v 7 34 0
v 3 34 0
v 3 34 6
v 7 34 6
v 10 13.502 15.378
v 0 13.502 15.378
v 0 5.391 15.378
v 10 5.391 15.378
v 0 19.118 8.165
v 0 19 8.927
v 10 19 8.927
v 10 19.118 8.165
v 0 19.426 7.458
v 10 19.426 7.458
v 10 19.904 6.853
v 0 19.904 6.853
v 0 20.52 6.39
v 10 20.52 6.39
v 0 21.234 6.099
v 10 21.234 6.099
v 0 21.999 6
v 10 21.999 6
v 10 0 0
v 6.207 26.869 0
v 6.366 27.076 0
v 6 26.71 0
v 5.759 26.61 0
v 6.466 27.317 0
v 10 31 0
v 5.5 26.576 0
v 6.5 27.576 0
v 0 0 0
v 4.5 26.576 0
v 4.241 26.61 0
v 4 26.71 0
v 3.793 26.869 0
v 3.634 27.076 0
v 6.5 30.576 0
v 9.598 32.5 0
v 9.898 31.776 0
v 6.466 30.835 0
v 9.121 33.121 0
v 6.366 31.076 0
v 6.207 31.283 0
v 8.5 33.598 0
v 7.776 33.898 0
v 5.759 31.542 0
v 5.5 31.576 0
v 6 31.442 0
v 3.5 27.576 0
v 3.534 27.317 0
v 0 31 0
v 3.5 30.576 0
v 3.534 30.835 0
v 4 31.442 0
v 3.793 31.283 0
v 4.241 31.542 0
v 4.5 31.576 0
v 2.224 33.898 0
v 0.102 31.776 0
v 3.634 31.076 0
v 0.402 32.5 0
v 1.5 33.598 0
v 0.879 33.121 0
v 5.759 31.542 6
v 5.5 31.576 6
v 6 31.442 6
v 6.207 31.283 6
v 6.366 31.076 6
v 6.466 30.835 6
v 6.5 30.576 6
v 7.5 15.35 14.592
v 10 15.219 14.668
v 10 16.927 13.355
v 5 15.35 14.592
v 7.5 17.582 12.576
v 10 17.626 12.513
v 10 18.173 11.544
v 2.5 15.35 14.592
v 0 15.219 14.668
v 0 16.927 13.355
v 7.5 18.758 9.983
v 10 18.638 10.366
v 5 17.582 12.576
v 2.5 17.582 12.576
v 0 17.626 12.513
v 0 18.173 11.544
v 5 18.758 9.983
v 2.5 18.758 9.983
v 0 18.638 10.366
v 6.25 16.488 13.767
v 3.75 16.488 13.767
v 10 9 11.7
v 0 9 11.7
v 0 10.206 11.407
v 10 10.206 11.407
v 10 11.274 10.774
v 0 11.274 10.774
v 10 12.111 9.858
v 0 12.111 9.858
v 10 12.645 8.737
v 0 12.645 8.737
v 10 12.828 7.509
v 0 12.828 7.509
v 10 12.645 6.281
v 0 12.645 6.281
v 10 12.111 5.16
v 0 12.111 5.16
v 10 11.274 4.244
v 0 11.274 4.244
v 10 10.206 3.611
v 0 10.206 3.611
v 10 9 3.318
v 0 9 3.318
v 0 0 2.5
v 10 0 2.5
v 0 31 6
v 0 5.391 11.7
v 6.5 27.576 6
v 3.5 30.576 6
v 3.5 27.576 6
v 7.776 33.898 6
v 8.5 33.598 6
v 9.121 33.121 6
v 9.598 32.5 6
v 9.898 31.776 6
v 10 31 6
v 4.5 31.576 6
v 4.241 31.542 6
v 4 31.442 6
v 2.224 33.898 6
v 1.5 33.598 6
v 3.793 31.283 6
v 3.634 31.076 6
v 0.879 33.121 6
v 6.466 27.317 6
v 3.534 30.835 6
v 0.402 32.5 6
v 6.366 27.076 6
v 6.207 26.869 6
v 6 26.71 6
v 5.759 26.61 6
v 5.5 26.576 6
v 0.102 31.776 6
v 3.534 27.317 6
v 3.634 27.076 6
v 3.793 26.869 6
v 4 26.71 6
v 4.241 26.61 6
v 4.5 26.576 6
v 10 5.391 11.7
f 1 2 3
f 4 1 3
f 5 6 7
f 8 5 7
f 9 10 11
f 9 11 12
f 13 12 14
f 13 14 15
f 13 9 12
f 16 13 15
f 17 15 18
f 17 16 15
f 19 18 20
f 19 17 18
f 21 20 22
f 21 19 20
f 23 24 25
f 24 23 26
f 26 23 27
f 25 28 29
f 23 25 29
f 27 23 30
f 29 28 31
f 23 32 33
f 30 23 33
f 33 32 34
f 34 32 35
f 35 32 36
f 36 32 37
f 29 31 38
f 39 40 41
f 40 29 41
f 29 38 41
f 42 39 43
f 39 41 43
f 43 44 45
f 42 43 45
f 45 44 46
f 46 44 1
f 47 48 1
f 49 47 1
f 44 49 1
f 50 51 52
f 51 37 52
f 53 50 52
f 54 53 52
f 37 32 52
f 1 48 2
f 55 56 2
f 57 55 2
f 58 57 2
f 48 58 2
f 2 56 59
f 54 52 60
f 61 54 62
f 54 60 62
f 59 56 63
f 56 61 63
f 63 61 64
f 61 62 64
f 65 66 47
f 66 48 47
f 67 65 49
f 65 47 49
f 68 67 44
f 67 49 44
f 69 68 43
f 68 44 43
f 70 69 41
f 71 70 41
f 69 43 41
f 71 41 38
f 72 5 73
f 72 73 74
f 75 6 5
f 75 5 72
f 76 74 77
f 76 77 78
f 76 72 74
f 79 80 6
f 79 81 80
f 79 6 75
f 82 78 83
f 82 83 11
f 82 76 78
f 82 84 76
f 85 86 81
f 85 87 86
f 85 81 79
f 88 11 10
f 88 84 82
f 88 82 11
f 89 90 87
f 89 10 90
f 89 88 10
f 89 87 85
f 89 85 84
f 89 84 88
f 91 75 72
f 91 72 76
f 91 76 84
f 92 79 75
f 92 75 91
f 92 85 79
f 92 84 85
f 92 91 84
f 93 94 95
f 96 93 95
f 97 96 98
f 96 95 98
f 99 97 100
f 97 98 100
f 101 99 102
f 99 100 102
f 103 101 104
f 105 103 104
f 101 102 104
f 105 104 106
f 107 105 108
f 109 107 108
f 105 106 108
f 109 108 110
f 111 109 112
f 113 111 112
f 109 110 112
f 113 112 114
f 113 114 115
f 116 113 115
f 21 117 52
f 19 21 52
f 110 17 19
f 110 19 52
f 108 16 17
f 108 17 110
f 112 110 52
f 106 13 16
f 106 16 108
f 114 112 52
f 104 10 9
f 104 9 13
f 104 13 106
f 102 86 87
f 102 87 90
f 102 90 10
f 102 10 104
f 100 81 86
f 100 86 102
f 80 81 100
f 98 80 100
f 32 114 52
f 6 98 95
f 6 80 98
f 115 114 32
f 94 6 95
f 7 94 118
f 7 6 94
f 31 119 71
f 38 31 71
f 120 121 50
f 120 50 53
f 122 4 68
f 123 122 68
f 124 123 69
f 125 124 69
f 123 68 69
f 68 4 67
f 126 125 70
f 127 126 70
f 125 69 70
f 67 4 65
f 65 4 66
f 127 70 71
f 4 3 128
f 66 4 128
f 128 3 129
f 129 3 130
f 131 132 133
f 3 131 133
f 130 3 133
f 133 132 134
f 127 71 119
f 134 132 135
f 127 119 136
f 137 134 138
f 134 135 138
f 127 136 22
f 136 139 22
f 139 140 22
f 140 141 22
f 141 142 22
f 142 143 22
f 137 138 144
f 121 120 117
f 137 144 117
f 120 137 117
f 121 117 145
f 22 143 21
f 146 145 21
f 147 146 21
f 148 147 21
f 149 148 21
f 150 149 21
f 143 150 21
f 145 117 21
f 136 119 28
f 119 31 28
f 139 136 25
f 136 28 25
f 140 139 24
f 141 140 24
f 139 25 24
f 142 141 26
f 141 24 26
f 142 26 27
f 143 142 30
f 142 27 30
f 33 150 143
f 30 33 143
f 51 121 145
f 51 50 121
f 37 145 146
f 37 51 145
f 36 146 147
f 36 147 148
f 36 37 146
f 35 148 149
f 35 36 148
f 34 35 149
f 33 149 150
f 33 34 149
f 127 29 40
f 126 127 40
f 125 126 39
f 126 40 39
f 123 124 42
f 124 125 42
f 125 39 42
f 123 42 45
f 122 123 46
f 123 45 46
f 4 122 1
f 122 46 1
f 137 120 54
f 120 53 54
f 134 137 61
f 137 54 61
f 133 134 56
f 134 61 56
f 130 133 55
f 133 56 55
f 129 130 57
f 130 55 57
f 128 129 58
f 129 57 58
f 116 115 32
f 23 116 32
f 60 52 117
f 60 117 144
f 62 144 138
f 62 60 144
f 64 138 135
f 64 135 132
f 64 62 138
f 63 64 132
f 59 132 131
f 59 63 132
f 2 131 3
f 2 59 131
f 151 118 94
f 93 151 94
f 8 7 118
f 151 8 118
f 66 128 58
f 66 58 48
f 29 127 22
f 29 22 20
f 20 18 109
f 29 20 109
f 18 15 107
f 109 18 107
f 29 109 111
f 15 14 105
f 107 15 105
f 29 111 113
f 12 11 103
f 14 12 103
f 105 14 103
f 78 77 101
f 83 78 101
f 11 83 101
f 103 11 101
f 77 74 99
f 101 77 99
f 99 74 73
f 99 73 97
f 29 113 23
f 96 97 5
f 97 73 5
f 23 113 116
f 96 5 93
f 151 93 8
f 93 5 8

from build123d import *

# Parameters (mm, degrees)
F1_DEPTH    = 10
F2_T1_DEPTH = 10
F2_T3_DEPTH = 21
F2_T5_DEPTH = 21
F3_W        = 3
F3_H        = 5
F4_DEPTH    = 25
F5_R        = 1


# Not quite as in the source:
# - a fillet or chamfer that OpenCascade refuses, or shapes differently, is made with other operations: its cross-section is extruded or revolved along the edge and cut away or added


with BuildPart() as f1:
    # F0 (on Right) → F1 (new body)
    with BuildSketch(Plane.YZ):
        with BuildLine():
            Line((0, 2.5), (0, 0))
            Line((0, 0), (34, 0))
            Line((34, 0), (34, 6))
            Line((34, 6), (19, 6))
            Line((19, 6), (19, 8.927215822))
            add(Edge.make_bspline(
                [(13.5019160807, 15.3781203553), (14.3536763756, 15.0835294533), (15.3076259705, 14.7454615797), (17.8235832578, 12.8012966962), (18.7947445626, 9.9588259689), (18.9257892428, 9.3615105358), (19, 8.927215822)],
                knots=[0, 0, 0, 0, 0.0707143844, 0.1572524963, 0.2414371446, 0.2933722159, 0.2933722159, 0.2933722159, 0.2933722159], degree=3))
            Line((13.5019160807, 15.3781203553), (5.3910082206, 15.3781203553))
            Line((5.3910082206, 15.3781203553), (5.3910082206, 13.2812492201))
            Line((5.3910082206, 13.2812492201), (5.3910082206, 11.7001235485))
            Line((5.3910082206, 11.7001235485), (9, 11.7001235485))
            ThreePointArc((9, 11.7001235485), (12.8276697655, 7.5089175953), (9, 3.317711642))
            Line((9, 3.317711642), (0, 2.5))
        make_face()
    extrude(amount=F1_DEPTH)

    # F2: fillet of radius 3 on 3 edges, made by hand

    # F2_s2 → F2_t1 (join)
    with BuildSketch(Plane.YZ):
        with BuildLine():
            ThreePointArc((19, 8.927215822), (19.9036876994, 6.8531007786), (21.9991169473, 6))
            Line((21.9991169473, 6), (19, 6))
            Line((19, 6), (19, 8.927215822))
        make_face()
    extrude(amount=F2_T1_DEPTH)

    # F2_s4 → F2_t3 (cut)
    with BuildSketch(Plane.XY.offset(-7.5)):
        with BuildLine():
            ThreePointArc((10, 31), (9.1213203436, 33.1213203436), (7, 34))
            Line((7, 34), (10, 34))
            Line((10, 34), (10, 31))
        make_face()
    extrude(amount=F2_T3_DEPTH, mode=Mode.SUBTRACT)

    # F2_s6 → F2_t5 (cut)
    with BuildSketch(Plane.XY.offset(-7.5)):
        with BuildLine():
            ThreePointArc((0, 31), (0.8786796564, 33.1213203436), (3, 34))
            Line((3, 34), (0, 34))
            Line((0, 34), (0, 31))
        make_face()
    extrude(amount=F2_T5_DEPTH, mode=Mode.SUBTRACT)

    # F3 (on face) → F4 (cut)
    with BuildSketch(Plane.XY.offset(6)):
        with Locations((5, 29.0757007897)):
            Rectangle(F3_W, F3_H)
    extrude(amount=-F4_DEPTH, mode=Mode.SUBTRACT)

    # F5
    f5_edges = [f1.edges().sort_by_distance(p)[0] for p in [
        (3.5, 26.575701, 3),
        (3.5, 31.575701, 3),
        (6.5, 26.575701, 3),
        (6.5, 31.575701, 3),
    ]]
    fillet(f5_edges, radius=F5_R)


solid = f1.part
